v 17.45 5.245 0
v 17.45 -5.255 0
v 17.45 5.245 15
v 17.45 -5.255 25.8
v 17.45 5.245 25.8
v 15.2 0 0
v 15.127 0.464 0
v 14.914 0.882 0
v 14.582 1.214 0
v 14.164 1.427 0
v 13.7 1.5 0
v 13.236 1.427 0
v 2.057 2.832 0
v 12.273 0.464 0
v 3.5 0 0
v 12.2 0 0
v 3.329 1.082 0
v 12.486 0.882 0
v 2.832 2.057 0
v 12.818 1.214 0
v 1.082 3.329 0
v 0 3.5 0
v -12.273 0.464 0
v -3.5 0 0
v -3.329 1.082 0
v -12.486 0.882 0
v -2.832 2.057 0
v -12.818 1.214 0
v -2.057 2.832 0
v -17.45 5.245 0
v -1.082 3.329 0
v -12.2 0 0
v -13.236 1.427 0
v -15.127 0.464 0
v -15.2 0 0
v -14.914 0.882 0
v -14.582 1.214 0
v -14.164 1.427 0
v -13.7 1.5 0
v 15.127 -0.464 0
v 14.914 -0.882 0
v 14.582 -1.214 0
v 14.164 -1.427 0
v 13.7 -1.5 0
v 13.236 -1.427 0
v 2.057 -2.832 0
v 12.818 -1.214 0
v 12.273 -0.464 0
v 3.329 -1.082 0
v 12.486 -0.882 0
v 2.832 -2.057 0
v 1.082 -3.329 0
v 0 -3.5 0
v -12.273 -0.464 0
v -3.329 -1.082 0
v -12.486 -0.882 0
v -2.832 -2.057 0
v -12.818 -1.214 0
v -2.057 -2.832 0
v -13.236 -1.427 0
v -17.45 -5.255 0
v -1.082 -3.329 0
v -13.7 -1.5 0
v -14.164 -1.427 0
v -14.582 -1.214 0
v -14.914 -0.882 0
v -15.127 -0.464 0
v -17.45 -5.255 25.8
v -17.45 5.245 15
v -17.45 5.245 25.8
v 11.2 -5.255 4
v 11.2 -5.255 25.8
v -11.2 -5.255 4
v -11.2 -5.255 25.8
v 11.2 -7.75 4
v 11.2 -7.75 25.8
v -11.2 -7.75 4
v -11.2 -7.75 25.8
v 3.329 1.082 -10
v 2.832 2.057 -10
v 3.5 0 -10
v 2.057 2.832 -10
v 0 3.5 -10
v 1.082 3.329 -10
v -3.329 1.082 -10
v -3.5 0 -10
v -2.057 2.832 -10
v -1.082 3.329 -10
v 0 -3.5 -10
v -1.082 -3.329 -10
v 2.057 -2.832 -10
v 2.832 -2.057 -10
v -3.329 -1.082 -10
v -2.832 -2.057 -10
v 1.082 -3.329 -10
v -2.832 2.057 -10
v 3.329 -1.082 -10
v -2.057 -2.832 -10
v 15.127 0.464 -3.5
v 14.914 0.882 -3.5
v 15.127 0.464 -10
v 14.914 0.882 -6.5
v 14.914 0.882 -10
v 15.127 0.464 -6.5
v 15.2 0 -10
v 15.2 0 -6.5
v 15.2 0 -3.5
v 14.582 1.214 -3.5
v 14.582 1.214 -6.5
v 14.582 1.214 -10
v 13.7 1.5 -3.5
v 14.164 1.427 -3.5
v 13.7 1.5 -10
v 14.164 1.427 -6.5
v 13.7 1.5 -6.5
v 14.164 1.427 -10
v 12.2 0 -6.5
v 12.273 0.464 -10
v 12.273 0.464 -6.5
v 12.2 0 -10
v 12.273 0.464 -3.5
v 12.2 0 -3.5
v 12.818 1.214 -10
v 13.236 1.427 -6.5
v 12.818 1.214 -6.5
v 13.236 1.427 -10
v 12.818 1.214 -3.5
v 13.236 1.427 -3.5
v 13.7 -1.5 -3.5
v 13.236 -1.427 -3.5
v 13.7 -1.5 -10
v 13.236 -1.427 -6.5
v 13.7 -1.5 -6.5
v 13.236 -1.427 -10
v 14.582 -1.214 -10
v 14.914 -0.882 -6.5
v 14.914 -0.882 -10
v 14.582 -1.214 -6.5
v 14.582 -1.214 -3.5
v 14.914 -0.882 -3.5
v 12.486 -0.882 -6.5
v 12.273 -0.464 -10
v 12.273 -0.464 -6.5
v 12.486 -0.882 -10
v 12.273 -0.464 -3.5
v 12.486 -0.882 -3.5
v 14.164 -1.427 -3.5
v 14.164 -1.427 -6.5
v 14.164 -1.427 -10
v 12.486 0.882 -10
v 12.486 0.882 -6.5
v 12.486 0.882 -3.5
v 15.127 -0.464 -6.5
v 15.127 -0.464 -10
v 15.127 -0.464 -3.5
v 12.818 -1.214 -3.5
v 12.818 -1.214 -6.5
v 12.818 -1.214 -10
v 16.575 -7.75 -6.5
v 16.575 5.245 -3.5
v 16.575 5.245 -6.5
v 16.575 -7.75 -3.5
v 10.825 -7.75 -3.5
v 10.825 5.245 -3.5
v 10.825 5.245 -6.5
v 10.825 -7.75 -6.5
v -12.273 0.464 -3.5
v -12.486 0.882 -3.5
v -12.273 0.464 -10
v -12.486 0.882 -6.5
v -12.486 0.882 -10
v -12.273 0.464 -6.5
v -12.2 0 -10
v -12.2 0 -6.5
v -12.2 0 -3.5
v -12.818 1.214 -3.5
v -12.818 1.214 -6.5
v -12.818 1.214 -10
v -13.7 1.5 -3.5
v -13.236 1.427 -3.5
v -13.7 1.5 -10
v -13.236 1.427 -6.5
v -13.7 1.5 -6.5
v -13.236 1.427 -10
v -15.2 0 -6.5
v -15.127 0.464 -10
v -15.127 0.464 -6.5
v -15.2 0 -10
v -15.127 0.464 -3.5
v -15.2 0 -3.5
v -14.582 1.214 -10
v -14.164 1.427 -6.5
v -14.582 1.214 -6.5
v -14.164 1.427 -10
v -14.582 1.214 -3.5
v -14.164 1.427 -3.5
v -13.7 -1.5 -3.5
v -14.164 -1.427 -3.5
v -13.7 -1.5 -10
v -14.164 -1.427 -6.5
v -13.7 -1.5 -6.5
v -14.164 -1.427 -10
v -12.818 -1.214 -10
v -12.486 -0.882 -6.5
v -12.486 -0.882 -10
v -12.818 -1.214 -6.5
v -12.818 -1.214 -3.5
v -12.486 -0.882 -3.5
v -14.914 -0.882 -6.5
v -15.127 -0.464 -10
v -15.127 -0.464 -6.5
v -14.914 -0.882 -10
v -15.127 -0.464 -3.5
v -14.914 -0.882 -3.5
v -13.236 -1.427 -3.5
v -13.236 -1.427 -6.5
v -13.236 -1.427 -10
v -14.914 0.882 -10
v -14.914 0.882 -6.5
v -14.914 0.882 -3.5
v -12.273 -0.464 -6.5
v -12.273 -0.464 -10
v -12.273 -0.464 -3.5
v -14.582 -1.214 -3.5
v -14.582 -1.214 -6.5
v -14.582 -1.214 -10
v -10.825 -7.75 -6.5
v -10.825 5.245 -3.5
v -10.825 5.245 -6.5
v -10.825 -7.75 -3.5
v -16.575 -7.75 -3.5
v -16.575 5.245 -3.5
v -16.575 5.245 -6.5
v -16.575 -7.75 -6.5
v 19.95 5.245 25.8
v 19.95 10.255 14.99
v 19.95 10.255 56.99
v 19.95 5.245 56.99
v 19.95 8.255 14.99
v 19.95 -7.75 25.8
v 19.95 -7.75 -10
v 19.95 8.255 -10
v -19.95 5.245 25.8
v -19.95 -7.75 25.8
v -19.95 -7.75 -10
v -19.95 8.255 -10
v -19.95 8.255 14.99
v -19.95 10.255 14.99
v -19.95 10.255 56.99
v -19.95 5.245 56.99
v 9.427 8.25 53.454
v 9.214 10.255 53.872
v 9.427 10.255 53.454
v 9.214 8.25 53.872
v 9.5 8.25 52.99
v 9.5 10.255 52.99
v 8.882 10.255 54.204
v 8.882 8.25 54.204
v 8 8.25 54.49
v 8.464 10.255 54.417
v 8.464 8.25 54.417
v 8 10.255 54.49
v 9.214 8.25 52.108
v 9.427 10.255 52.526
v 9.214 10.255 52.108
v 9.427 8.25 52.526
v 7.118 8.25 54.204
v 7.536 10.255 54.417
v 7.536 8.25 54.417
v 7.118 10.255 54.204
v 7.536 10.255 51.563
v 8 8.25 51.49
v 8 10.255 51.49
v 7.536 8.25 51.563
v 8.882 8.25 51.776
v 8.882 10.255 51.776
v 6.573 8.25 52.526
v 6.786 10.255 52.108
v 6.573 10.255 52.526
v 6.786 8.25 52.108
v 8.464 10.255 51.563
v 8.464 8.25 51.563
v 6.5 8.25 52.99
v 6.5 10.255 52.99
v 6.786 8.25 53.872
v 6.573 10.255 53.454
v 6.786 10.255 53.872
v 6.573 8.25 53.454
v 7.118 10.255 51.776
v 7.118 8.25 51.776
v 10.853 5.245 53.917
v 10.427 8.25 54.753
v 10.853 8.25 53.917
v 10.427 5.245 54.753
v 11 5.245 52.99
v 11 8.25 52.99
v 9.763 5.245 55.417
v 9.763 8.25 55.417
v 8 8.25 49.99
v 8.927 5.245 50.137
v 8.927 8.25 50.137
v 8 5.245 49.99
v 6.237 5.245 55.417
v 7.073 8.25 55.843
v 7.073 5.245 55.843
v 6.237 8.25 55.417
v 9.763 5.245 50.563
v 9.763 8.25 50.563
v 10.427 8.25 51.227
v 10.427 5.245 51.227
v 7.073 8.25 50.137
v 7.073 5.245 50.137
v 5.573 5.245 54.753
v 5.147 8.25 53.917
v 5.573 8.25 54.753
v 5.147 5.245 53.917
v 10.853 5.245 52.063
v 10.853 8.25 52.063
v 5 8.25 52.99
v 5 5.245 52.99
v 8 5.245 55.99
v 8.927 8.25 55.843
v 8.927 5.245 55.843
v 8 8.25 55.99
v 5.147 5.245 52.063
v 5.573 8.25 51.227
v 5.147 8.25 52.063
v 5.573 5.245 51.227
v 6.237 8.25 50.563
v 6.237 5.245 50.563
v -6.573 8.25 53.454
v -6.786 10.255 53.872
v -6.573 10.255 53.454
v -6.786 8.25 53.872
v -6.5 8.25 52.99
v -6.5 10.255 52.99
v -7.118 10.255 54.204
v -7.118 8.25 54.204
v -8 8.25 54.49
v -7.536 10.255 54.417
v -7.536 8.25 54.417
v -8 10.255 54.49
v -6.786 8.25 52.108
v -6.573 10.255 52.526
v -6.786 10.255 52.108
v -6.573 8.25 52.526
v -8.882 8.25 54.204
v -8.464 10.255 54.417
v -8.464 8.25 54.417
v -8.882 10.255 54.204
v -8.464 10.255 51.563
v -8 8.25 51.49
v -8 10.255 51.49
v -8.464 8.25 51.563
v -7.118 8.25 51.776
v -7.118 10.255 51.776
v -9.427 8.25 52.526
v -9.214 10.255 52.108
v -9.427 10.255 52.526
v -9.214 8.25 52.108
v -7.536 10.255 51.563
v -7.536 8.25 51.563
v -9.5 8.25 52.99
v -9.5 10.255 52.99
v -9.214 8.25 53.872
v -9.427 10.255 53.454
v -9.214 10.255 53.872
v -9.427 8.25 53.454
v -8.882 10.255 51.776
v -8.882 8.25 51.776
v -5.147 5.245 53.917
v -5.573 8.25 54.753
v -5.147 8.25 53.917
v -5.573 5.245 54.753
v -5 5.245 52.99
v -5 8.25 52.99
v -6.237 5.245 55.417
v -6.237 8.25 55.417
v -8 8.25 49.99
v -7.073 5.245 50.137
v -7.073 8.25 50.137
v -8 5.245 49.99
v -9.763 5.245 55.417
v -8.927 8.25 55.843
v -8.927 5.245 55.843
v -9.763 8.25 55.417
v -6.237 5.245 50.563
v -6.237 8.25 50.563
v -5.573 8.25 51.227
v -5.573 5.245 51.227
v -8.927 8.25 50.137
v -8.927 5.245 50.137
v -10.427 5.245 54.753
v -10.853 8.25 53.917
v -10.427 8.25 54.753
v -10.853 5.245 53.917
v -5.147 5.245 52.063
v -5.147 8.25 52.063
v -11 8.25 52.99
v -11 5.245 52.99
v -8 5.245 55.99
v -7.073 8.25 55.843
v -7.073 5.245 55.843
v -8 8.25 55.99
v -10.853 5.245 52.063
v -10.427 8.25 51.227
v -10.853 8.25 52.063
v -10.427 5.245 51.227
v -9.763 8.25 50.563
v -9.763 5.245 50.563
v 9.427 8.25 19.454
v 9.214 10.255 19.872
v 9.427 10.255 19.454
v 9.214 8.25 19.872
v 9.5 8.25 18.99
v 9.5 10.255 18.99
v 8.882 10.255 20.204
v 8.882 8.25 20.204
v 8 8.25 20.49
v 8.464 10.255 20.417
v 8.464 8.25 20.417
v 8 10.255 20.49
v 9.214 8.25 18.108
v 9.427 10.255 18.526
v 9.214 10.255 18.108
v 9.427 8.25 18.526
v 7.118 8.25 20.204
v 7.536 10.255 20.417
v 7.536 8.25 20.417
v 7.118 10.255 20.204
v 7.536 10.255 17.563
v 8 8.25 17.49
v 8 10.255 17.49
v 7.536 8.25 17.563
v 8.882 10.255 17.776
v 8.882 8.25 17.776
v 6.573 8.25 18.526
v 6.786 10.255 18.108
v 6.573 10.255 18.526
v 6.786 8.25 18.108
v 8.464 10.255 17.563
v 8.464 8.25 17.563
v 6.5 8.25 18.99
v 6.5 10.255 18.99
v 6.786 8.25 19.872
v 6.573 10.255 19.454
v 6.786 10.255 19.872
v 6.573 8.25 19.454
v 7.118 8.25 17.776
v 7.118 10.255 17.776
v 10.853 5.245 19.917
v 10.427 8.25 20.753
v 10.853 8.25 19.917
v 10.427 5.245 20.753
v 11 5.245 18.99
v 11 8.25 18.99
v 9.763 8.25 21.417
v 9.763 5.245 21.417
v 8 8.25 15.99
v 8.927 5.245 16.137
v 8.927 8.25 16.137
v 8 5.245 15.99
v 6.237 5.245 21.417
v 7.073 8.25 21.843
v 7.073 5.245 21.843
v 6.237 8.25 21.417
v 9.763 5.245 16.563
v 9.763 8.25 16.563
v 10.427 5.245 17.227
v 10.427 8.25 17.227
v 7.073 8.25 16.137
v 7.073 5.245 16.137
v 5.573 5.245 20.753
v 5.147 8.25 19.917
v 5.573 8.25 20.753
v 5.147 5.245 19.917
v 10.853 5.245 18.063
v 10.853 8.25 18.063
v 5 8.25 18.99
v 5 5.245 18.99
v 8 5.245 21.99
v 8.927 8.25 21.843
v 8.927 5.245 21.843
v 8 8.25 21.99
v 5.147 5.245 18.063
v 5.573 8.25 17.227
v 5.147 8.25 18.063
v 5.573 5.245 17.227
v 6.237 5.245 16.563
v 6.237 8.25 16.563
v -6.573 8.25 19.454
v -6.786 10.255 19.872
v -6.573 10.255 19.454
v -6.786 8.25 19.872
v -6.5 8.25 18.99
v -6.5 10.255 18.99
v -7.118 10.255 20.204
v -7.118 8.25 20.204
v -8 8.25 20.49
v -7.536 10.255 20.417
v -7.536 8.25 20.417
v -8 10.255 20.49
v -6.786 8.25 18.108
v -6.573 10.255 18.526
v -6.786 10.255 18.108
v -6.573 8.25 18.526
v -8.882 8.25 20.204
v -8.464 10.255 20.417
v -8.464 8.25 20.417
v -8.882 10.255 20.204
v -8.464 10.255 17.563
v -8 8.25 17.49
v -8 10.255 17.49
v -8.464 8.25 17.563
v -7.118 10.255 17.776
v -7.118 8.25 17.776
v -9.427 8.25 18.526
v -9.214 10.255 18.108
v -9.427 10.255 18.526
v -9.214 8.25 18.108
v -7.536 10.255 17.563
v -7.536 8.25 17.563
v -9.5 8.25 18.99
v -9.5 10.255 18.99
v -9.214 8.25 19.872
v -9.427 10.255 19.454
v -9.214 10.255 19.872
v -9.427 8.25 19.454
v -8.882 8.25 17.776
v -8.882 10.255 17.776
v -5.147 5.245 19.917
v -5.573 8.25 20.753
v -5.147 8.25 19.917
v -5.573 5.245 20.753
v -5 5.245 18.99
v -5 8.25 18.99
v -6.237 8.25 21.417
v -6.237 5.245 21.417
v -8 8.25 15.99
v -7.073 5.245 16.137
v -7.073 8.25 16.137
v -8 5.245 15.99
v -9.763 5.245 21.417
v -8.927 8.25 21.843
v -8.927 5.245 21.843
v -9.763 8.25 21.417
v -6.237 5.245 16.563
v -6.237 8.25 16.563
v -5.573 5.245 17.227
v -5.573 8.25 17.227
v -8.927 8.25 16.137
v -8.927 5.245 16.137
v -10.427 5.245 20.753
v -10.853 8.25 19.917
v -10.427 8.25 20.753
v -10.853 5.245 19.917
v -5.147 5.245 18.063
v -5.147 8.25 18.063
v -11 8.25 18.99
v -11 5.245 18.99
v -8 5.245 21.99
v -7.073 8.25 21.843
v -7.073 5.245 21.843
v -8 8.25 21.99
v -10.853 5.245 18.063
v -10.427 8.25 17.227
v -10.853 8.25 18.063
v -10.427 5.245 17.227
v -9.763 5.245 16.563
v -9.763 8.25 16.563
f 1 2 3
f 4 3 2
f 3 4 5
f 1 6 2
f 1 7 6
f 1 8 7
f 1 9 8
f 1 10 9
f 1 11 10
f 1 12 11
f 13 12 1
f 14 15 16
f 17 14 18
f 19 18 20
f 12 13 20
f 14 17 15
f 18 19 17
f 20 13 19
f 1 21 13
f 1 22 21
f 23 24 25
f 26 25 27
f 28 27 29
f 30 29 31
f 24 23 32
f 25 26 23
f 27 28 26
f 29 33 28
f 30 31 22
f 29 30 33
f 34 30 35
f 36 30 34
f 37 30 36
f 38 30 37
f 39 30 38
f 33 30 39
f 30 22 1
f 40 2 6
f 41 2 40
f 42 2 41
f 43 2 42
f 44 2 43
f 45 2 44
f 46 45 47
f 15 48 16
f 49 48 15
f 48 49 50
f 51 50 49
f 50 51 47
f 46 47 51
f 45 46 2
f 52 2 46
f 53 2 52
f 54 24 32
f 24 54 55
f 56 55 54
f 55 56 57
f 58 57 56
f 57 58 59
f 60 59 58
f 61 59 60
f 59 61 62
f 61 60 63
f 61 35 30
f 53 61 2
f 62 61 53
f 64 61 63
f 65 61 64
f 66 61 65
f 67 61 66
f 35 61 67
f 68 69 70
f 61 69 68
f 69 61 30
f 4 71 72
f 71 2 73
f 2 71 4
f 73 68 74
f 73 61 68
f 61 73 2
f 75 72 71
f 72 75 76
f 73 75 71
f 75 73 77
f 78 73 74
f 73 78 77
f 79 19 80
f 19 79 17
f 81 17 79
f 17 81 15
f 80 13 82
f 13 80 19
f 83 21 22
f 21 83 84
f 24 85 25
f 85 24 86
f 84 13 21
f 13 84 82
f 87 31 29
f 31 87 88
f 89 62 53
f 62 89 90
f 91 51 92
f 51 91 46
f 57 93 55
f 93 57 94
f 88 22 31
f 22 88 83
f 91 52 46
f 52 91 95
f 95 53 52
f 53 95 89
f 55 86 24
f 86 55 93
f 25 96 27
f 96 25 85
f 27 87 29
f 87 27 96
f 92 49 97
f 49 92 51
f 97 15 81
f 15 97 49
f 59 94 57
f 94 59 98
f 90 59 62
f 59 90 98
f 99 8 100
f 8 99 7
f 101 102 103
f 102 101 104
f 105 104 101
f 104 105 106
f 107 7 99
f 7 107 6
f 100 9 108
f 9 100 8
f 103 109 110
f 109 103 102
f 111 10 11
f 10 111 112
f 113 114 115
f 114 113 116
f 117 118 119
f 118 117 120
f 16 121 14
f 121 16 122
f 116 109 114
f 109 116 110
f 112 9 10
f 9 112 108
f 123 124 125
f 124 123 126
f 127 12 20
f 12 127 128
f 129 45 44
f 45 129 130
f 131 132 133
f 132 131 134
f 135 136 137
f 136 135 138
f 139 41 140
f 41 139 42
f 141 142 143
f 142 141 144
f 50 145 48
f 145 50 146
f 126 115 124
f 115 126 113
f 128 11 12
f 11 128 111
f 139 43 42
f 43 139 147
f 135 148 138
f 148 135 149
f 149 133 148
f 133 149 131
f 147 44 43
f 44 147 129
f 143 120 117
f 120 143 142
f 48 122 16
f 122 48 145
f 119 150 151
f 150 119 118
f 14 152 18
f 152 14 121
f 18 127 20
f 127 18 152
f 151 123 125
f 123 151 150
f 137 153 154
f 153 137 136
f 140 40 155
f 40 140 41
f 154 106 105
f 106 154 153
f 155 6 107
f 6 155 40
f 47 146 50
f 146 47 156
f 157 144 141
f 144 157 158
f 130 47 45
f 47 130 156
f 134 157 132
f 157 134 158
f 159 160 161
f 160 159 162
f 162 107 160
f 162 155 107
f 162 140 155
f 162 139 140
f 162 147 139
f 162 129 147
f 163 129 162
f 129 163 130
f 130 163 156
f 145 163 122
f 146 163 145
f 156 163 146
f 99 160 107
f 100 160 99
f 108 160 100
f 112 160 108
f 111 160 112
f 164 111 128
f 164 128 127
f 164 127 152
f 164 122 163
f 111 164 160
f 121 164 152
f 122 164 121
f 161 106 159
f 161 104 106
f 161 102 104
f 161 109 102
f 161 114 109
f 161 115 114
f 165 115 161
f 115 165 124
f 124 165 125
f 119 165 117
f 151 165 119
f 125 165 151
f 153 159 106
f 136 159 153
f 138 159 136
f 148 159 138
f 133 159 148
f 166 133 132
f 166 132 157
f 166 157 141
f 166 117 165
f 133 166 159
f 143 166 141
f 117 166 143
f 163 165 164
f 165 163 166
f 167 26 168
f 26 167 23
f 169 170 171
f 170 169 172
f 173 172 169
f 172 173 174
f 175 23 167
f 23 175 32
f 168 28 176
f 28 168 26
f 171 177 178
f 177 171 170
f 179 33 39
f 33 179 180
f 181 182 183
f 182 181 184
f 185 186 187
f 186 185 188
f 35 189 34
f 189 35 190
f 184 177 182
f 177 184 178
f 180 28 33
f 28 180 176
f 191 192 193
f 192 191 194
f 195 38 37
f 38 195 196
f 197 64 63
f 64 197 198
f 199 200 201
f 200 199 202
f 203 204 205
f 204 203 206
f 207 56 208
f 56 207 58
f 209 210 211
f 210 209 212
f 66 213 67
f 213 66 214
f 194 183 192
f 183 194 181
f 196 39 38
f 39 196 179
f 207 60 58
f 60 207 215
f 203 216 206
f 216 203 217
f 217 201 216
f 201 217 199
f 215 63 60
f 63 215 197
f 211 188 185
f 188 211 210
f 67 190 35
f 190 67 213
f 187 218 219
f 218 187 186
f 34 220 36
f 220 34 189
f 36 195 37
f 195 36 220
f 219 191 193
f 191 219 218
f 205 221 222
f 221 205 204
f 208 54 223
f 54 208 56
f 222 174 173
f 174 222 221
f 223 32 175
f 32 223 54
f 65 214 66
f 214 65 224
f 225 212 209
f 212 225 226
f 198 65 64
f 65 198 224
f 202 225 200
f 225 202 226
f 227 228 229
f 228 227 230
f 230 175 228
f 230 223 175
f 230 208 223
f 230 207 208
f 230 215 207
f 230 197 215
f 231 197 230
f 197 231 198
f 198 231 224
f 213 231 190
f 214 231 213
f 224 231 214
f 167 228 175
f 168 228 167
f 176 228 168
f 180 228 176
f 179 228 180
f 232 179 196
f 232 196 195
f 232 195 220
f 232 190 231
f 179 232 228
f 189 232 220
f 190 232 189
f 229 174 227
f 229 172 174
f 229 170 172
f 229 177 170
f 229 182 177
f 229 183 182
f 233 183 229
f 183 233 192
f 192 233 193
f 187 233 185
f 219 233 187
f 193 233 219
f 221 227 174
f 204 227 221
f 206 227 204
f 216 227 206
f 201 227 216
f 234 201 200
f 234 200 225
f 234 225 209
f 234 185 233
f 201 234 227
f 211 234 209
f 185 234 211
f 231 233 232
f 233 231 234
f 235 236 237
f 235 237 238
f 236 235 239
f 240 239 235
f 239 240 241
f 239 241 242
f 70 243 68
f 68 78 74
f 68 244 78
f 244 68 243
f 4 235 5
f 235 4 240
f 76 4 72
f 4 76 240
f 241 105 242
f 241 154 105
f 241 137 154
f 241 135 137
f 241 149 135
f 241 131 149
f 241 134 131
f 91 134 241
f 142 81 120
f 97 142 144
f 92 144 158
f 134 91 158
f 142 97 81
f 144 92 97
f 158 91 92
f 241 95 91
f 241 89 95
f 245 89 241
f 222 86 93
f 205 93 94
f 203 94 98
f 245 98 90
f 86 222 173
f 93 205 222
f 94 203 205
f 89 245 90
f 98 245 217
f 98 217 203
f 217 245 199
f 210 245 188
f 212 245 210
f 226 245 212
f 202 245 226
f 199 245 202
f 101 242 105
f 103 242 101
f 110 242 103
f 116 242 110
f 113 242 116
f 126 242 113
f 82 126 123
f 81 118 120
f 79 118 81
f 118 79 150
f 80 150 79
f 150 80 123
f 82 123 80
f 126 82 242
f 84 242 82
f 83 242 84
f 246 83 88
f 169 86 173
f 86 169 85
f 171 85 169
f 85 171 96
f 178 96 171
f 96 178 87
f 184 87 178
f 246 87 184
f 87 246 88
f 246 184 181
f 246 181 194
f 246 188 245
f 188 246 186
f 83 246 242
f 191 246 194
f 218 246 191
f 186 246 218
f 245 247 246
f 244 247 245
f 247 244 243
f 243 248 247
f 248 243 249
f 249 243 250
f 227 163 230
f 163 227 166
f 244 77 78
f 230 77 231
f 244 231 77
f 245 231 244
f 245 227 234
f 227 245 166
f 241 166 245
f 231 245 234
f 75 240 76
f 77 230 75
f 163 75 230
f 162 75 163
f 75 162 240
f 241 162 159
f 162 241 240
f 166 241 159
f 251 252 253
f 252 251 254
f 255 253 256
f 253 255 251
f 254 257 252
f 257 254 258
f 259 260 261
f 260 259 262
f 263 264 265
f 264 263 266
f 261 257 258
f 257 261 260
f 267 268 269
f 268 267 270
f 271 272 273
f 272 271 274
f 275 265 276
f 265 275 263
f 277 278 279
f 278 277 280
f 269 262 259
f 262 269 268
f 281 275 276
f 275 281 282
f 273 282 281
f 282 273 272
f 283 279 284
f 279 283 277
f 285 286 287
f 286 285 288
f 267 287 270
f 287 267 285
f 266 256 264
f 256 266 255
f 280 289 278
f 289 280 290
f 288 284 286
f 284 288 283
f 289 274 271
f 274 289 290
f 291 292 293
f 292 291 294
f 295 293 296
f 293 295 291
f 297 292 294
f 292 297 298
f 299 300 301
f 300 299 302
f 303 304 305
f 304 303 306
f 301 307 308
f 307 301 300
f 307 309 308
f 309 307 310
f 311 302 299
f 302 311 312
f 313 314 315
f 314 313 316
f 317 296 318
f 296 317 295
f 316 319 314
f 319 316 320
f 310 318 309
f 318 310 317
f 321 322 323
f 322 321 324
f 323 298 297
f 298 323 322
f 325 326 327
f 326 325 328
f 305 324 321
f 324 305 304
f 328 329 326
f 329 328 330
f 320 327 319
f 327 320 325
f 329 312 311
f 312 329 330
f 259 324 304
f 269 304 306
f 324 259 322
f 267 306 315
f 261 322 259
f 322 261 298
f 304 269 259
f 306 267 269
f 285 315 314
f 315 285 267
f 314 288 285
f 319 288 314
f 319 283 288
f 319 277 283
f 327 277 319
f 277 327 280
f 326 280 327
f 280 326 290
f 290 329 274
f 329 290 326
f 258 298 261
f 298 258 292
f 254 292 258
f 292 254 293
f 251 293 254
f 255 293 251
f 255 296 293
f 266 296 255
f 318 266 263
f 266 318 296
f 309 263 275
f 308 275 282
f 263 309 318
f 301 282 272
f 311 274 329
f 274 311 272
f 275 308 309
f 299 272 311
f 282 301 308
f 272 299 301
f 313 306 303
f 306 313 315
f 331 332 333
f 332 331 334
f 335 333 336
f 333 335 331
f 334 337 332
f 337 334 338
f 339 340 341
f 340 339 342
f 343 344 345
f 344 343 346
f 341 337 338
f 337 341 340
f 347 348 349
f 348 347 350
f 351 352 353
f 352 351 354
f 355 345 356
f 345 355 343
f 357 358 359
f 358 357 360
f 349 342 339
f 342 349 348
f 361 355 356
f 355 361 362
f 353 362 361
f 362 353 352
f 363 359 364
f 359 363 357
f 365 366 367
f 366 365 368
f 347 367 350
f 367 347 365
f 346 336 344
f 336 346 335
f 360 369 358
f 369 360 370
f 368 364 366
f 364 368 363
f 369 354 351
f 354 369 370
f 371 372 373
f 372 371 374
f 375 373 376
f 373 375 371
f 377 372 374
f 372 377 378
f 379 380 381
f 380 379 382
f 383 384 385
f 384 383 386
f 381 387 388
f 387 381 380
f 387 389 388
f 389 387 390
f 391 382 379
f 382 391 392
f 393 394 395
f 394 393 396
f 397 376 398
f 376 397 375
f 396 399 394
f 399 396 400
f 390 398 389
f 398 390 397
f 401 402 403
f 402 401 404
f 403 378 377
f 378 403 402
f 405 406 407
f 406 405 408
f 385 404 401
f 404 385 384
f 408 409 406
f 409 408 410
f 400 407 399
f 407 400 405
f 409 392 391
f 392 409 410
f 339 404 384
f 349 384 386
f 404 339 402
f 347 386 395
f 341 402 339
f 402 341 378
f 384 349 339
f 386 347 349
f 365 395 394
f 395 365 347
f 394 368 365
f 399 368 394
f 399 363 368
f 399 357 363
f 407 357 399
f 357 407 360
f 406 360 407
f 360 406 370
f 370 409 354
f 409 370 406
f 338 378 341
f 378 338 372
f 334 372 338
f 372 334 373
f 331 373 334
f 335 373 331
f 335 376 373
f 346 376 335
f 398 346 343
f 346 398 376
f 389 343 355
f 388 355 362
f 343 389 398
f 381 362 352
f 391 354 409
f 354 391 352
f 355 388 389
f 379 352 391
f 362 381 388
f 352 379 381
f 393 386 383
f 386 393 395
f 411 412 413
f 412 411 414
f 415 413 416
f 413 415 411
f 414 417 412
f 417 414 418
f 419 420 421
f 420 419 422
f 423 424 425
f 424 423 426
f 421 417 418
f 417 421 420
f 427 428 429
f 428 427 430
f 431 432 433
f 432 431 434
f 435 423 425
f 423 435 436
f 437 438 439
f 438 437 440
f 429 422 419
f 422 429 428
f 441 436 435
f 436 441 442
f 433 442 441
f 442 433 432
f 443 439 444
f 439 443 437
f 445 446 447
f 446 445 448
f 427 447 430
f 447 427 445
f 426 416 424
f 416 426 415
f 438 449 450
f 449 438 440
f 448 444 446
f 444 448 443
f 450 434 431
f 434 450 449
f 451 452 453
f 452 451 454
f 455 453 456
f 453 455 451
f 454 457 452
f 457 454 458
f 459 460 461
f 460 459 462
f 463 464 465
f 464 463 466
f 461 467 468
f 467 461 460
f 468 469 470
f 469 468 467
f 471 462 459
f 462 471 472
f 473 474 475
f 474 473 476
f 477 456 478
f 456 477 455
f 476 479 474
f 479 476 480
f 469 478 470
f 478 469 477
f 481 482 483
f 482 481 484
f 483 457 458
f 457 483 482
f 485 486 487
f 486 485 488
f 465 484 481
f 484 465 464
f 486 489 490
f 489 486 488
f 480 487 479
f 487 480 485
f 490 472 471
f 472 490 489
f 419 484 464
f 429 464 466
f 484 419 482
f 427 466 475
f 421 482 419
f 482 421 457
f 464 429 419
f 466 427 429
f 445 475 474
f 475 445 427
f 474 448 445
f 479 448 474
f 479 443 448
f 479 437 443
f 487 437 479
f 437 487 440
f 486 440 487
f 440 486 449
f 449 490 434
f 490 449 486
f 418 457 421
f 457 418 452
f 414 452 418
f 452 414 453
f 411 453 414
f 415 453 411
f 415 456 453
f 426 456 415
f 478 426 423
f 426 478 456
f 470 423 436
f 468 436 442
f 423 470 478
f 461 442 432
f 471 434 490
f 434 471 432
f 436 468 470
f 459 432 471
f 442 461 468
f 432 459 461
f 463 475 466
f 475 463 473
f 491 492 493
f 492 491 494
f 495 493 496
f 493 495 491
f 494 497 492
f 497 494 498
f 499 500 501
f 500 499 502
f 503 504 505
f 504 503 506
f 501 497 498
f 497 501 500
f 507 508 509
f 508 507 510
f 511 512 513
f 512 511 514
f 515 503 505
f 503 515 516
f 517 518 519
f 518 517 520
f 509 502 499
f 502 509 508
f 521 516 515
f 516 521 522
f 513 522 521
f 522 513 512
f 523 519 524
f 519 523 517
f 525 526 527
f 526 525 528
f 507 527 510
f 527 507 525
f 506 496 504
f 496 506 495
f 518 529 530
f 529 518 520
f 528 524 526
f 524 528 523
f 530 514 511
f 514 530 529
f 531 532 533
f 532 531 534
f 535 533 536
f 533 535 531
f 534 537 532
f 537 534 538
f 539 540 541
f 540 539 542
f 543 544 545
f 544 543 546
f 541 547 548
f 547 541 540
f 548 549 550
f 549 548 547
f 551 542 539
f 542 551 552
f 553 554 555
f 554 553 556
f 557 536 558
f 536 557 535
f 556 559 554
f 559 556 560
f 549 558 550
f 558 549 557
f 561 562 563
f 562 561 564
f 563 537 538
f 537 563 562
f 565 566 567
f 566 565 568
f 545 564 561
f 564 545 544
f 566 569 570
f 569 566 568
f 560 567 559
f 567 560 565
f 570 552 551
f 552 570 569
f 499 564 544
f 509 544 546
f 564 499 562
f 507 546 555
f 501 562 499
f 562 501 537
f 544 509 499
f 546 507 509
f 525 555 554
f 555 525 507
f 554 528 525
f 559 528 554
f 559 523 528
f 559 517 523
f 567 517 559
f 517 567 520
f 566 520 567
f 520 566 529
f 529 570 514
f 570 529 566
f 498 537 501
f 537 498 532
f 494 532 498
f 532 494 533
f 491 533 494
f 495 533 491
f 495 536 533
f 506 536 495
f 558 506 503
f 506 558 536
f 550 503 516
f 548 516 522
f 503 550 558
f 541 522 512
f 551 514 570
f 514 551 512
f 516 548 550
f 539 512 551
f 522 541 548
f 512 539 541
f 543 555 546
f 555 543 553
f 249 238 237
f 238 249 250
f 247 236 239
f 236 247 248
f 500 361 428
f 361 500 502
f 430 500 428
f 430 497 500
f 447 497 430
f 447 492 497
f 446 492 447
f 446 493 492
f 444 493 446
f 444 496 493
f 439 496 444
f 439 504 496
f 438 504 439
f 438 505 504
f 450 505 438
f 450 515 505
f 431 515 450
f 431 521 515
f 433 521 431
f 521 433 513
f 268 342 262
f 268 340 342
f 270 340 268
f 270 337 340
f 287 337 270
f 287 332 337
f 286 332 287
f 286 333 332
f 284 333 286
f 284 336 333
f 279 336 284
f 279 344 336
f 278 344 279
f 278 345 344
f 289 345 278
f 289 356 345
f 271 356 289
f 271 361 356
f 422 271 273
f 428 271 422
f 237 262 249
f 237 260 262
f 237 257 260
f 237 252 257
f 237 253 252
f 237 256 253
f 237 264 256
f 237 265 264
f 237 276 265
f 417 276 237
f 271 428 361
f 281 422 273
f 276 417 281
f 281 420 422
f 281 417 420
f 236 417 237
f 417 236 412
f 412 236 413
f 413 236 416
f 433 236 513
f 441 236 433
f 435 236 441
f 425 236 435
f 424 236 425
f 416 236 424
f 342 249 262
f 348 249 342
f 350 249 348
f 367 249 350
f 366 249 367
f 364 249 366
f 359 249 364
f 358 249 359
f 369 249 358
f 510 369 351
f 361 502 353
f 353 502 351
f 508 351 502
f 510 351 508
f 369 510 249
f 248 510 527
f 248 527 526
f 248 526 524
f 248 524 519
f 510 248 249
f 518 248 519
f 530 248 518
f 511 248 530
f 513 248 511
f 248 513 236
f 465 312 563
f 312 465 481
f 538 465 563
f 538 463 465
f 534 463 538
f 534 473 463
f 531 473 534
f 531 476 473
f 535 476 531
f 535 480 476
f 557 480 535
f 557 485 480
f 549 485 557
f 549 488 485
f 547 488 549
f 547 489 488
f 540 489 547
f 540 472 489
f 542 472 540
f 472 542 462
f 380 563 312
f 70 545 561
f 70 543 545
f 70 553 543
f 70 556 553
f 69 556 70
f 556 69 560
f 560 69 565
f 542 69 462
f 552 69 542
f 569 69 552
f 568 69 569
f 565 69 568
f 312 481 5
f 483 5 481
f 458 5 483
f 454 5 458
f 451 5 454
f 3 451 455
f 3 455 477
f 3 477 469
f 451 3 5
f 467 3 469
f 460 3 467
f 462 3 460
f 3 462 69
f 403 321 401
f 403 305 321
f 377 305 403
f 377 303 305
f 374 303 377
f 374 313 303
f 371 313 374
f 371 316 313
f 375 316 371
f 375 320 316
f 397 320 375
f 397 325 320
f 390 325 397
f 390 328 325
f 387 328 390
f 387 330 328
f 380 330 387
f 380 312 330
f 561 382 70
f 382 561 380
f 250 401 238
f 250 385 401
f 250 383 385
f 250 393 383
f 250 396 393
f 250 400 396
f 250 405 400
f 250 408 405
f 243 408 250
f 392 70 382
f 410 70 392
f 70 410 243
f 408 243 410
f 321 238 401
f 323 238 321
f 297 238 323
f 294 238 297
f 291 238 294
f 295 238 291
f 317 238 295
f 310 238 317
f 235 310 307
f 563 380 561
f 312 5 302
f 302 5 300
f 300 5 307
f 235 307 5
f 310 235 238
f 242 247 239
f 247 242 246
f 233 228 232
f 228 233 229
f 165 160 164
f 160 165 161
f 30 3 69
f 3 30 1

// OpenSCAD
// file: ../../../parts/switch.scad
/*
    SWITCH
*/

switch_x = 19.8;
switch_y = 11.5;
switch_y_total = 15.3;
switch_z = 6.4;
switch_diameter = 2; // 2.5

module switch() {
	
	//difference() {
		
		union() {
				
			translate([0, (switch_y / 2) - 2.9, 0])
			cube([switch_x, switch_y, switch_z], center = true);
			
			switch_pin_y = switch_y_total - switch_y;
			color([0, 1, 0, 0.7])
			translate([0, -(switch_pin_y / 2) - 2.9 + 0.01, 0])
			cube([switch_x, switch_pin_y, switch_z], center = true);
		}
		
		color([1, 0, 0, 0.7])
		union() {
			translate([-9.5 / 2, 0, 0])
			cylinder (r=(switch_diameter / 2), h=20 , center=true);
			translate([ 9.5 / 2, 0, 0])
			cylinder (r=(switch_diameter / 2), h=20 , center=true);
		}
	//}
}
// ss-5gl
// file: ../../config.scad
include <../parts/switch.scad>


rod_side = 16;
rod_length = 700;

rod_horizontal_spacing	= 120; // center to center / min 105
rod_vertical_spacing	= 2;

bearing_outer_diameter = 10;
bearing_inner_diameter = 3;
bearing_height = 4;

    // avoid touching this except if you know what's you're doing
    
bearing_holder_spacing_1 = 0.7; // space between bearing flat sides and piece
bearing_holder_spacing_2 = 1; // space between bearing perimeter and piece
bearing_holder_width = 3; // thickness of pieces holding the bearings
bearing_screw_access_size = 10; // the size of the cube to remove to be able to put in place the bearing screw

screw_exceed = 3; // how much you want a screew can exceed in length
    // default M3 screws size
screw_diameter = 3; // the diameter of your screws
    // default M3 nuts size
screws_nuts_side_min = 5.75; // 5.4min
screws_nuts_side_max = 6.55; // default is 6mm but we add some margin
screw_nuts_height = 3; // default is 2.4mm
screws_material_holder_min_size = 3; // the minimum of material arround a screw
screws_attach_length = 10; // the min length of the screew which will attach the 2 pieces

rod_holder_size = 10; // the length of material which will tighten the cariage rods

rod_piece_spacing = 1; // space between rod and piece
   
pieces_spacing = 1; // the space between the 2 pieces

motor_holder_thickness = 4; // thickness of motor support


/*
    Computed variables for future use
*/

rod_remove_side = rod_side + (rod_piece_spacing * 2);

    // represent the min size of material which should warp a screw
screw_virtual_holder_side = screw_diameter + (screws_material_holder_min_size * 2);

	// represent the area taken by bearings
bearing_virtual_cube_side = (((rod_side / 2) + bearing_outer_diameter + (bearing_height / 2) + bearing_holder_spacing_1 + bearing_holder_width) / sqrt(2)) * 2;

    // the outers screews could touch the rod, so we need to compute an offset
space_rod_outer = (bearing_virtual_cube_side - (rod_remove_side * sqrt(2))) / 2; // the minimum must be screw_virtual_holder_side
echo("space_rod_outer", space_rod_outer);
outer_screw_offset = abs(screw_virtual_holder_side - space_rod_outer);

	// base piece size
base_block_x = rod_horizontal_spacing + (rod_side * sqrt(2)) + (screw_virtual_holder_side * 2);  
base_block_y = bearing_virtual_cube_side + rod_holder_size /*+ screw_virtual_holder_side*/ + outer_screw_offset;
base_block_z = max(bearing_virtual_cube_side, rod_remove_side * sqrt(2) + motor_holder_thickness * 2);


 base_block_remove_x = rod_horizontal_spacing - (rod_side * sqrt(2)) - (screw_virtual_holder_side * 2);
base_block_remove_y = base_block_y;
base_block_remove_z = max(rod_remove_side * sqrt(2), base_block_z - (motor_holder_thickness * 2));



/*
    RODS
*/

module rod(show_rods) {
    if(show_rods) {
        color([0.7, 0.7, 0.7])
        rotate([45, 0, 0])
        cube([rod_length, rod_side, rod_side], center = true);
    }
}
// draw a rod


module screw() {
    screw_height = 50;
    cylinder (r=(screw_diameter / 2), h=screw_height , center=true);
}




module base_screw_remove_tighten() {
    
    
    color([1, 0, 0, 0.7])
    union() {
        
        screw_length = base_block_z + 1;
        
        cylinder (r=(screw_diameter / 2), h=screw_length, center=true);
    
        nuts_remove_length = (screw_length / 2) - (screws_attach_length / 2);
    
        translate([0, 0, (screw_length / 2) - (nuts_remove_length / 2)])
        cylinder ($fn = 6, r=(screws_nuts_side_max / 2), h=nuts_remove_length, center=true);
        
        translate([0, 0, -((screw_length / 2) - (nuts_remove_length / 2))])
        cylinder ($fn = 6, r=(screws_nuts_side_max / 2), h=nuts_remove_length, center=true);
    }
}
// base_screw_remove_tighten



/*
    SWITCH
*/

switch_x = 19.8;
switch_y = 11.5;
switch_y_total = 15.3;
switch_z = 6.4;
switch_diameter = 2; // 2.5

module switch() {
	
	//difference() {
		
		union() {
				
			translate([0, (switch_y / 2) - 2.9, 0])
			cube([switch_x, switch_y, switch_z], center = true);
			
			switch_pin_y = switch_y_total - switch_y;
			color([0, 1, 0, 0.7])
			translate([0, -(switch_pin_y / 2) - 2.9 + 0.01, 0])
			cube([switch_x, switch_pin_y, switch_z], center = true);
		}
		
		color([1, 0, 0, 0.7])
		union() {
			translate([-9.5 / 2, 0, 0])
			cylinder (r=(switch_diameter / 2), h=20 , center=true);
			translate([ 9.5 / 2, 0, 0])
			cylinder (r=(switch_diameter / 2), h=20 , center=true);
		}
	//}
}
// ss-5gl
// main file
$fn=20;

include <../../config.scad>
include <../cariage/cariage.scad>

rod_side = 20.4;

pieces_margin = 0.5;

rod_fix_thickness_x = 7;
rod_fix_thickness_y = 10;
rod_fix_thickness_z = 4;
rod_fix_thickness_z_gap = 0.6;

cariage_fix_z_adjust = 25;


rod_fix_x = rod_side + 2 * rod_fix_thickness_x;
rod_fix_y = rod_fix_thickness_y;
rod_fix_z = rod_side + rod_fix_thickness_z - rod_fix_thickness_z_gap;

rod_fix_z_offset = -(rod_fix_z / 2) + (rod_side / 2) - rod_fix_thickness_z_gap;

cariage_fix_thickness = 2.5;
cariage_fix_thickness_z = 10;

cariage_fix_x = rod_fix_x + pieces_margin + (cariage_fix_thickness * 2);
cariage_fix_y = rod_fix_y + pieces_margin + cariage_fix_thickness;
cariage_fix_z = cariage_fix_thickness_z + rod_fix_z + 2;

cariage_fix_y_offset = -(cariage_fix_thickness / 2);
cariage_fix_z_offset = (cariage_fix_z / 2) - cariage_fix_thickness_z;

cariage_fix_back_plate_x = cariage_fix_x;
cariage_fix_back_plate_y = 5;
cariage_fix_back_plate_z = base_z;

screw_head_diameter = 6;


/*
    ROD FIX
*/

module positioned_rod() {
	color([0.7, 0.7, 0.7])
    cube([rod_side, 1000, rod_side], center = true);
}
// positioned_rod




module fix_screw(pos_x) {
	screw_head_height = 20;
	
	screw_head_z_thickness = 8;
	screw_head_z_offet = rod_fix_z_offset + (screw_head_height / 2) - (rod_fix_z / 2) + screw_head_z_thickness;
	
	screw_x_offset = (rod_fix_x / 2) - (rod_fix_thickness_x / 2);
	color([1, 0, 0])
	translate([screw_x_offset * pos_x, 0, 0])
	union() {
		screw();
		translate([0, 0, screw_head_z_offet])
		cylinder (r=(screw_head_diameter / 2), h=screw_head_height , center=true);
	}
}
// fix_screw


module positioned_screws() {
	fix_screw(+1);
	fix_screw(-1);
}
// positioned_screws


module rod_fix_base() {
	color([1, 1, 0, 0.7])
	translate([0, 0, rod_fix_z_offset])
	cube([rod_fix_x, rod_fix_y, rod_fix_z], center = true);
}
//rod_fix_base

module rod_fix() {
	difference() {
		rod_fix_base();
		screw();
		positioned_screws();
		positioned_rod();
	}
}
// rod_fix


/*
    CARIAGE FIX
*/


module base_screw_remove_fixation(pos_x, pos_z) {
	screw_height = 20;
	screw_head_height = 3;

	fixation_offset_x = 8;
	fixation_offset_y = -(cariage_fix_back_plate_y / 2) + screw_head_height * 1;
	fixation_offset_z = (base_z / 2) - (screw_virtual_holder_side_smaller / 2);
	
	translate([fixation_offset_x * pos_x, fixation_offset_y, fixation_offset_z * pos_z])
	color([1, 0, 1, 0.7])
	rotate([90, 0, 0])
	union() {
		translate([0, 0, -(screw_height / 2) + 0.01])
		cylinder (r=(screw_diameter / 2), h=screw_height , center=true);
		
		translate([0, 0, (screw_height / 2)])
		cylinder (r=(screw_head_diameter / 2), h=screw_height , center=true);
		
	}
}
//base_screw_remove_fixation

module positioned_cariage_fix_screws() {
	base_screw_remove_fixation(+1, +1);
	base_screw_remove_fixation(-1, +1);
	base_screw_remove_fixation(+1, -1);
	base_screw_remove_fixation(-1, -1);
}
//positioned_cariage_fix_screws






module cariage_fix_screw(pos_x) {
	screw_x_offset = (rod_fix_x / 2) - (rod_fix_thickness_x / 2);
	color([1, 0, 0])
	translate([screw_x_offset * pos_x, 0, 0])
	union() {
		screw();
		
		nut_y = 20;
		nut_offset_z = -(cariage_fix_thickness_z / 2);
		translate([0, 0, nut_offset_z])
		cube([screws_nuts_side_min, nut_y, screw_nuts_height], center = true);
	}
	
}
// cariage_fix_screw

module cariage_fix_screw_remove() {
	cariage_fix_screw(+1);
	cariage_fix_screw(-1);
}
//cariage_fix_screw_remove

module cariage_fix_base_remove() {
	cariage_fix_base_remove_x = rod_fix_x + pieces_margin;
	cariage_fix_base_remove_y = (rod_fix_y + pieces_margin);
	cariage_fix_base_remove_z = 30;
	
	color([1, 0, 0])
	translate([0, 0, (cariage_fix_base_remove_z / 2)])
	union() {
		cube([cariage_fix_base_remove_x, cariage_fix_base_remove_y + 0.01, cariage_fix_base_remove_z], center = true);
		
		cariage_fix_base_remove_x_2 = rod_side + 2;
		translate([0, 0, rod_fix_thickness_z])
		cube([cariage_fix_base_remove_x_2, 30, cariage_fix_base_remove_z], center = true);
		
		
		cariage_fix_base_remove_cylinder_diameter = 7;
		cylinder (r=(cariage_fix_base_remove_cylinder_diameter / 2), h=60 , center=true);
	}
}
//cariage_fix_base_remove

module cariage_fix_base() {
	color([1, 1, 0, 0.7])
	translate([0, cariage_fix_y_offset, cariage_fix_z_offset])
	cube([cariage_fix_x, cariage_fix_y, cariage_fix_z], center = true);
}
//cariage_fix_base

module cariage_fix_back_plate() {
	
	
	
	cariage_fix_back_plate_y_offset = cariage_fix_y_offset + (cariage_fix_y / 2) + (cariage_fix_back_plate_y / 2);
	cariage_fix_back_plate_z_offset = (cariage_fix_back_plate_z / 2) - cariage_fix_thickness_z;
	
	translate([0, cariage_fix_back_plate_y_offset, cariage_fix_back_plate_z_offset])
	difference() {
		color([1, 1, 0, 0.7])
		cube([cariage_fix_back_plate_x, cariage_fix_back_plate_y + 0.01, cariage_fix_back_plate_z], center = true);
		
		positioned_cariage_fix_screws();
	}
}
//cariage_fix_back_plate


module positionned_cariage_fix_back_plate() {
	
	union() {
		
		translate([0, 0, cariage_fix_z_adjust - 0.01])
		cariage_fix_back_plate();
		
		
		
		cariage_fix_back_plate_remain_y = cariage_fix_back_plate_y - 2;
		cariage_fix_back_plate_remain_z = cariage_fix_z_adjust;
		
		cariage_fix_back_plate_remain_y_offset = cariage_fix_y_offset + (cariage_fix_y / 2) + (cariage_fix_back_plate_remain_y / 2);
		
		cariage_fix_back_plate_z_offset = (cariage_fix_back_plate_remain_z / 2) - cariage_fix_thickness_z;
		
		translate([0, cariage_fix_back_plate_remain_y_offset, cariage_fix_back_plate_z_offset])
		cube([cariage_fix_back_plate_x, cariage_fix_back_plate_remain_y + 0.01, cariage_fix_back_plate_remain_z], center = true);
	}
}
//positionned_cariage_fix_back_plate


module cariage_fix() {
	difference() {
		cariage_fix_base();
		cariage_fix_base_remove();
		cariage_fix_screw_remove();
	}
}
// cariage_fix


module _render() {
//	translate([0, 0, +17])
//	rod_fix();
	
	union() {
		cariage_fix();
		positionned_cariage_fix_back_plate();
	}
}


_render();
